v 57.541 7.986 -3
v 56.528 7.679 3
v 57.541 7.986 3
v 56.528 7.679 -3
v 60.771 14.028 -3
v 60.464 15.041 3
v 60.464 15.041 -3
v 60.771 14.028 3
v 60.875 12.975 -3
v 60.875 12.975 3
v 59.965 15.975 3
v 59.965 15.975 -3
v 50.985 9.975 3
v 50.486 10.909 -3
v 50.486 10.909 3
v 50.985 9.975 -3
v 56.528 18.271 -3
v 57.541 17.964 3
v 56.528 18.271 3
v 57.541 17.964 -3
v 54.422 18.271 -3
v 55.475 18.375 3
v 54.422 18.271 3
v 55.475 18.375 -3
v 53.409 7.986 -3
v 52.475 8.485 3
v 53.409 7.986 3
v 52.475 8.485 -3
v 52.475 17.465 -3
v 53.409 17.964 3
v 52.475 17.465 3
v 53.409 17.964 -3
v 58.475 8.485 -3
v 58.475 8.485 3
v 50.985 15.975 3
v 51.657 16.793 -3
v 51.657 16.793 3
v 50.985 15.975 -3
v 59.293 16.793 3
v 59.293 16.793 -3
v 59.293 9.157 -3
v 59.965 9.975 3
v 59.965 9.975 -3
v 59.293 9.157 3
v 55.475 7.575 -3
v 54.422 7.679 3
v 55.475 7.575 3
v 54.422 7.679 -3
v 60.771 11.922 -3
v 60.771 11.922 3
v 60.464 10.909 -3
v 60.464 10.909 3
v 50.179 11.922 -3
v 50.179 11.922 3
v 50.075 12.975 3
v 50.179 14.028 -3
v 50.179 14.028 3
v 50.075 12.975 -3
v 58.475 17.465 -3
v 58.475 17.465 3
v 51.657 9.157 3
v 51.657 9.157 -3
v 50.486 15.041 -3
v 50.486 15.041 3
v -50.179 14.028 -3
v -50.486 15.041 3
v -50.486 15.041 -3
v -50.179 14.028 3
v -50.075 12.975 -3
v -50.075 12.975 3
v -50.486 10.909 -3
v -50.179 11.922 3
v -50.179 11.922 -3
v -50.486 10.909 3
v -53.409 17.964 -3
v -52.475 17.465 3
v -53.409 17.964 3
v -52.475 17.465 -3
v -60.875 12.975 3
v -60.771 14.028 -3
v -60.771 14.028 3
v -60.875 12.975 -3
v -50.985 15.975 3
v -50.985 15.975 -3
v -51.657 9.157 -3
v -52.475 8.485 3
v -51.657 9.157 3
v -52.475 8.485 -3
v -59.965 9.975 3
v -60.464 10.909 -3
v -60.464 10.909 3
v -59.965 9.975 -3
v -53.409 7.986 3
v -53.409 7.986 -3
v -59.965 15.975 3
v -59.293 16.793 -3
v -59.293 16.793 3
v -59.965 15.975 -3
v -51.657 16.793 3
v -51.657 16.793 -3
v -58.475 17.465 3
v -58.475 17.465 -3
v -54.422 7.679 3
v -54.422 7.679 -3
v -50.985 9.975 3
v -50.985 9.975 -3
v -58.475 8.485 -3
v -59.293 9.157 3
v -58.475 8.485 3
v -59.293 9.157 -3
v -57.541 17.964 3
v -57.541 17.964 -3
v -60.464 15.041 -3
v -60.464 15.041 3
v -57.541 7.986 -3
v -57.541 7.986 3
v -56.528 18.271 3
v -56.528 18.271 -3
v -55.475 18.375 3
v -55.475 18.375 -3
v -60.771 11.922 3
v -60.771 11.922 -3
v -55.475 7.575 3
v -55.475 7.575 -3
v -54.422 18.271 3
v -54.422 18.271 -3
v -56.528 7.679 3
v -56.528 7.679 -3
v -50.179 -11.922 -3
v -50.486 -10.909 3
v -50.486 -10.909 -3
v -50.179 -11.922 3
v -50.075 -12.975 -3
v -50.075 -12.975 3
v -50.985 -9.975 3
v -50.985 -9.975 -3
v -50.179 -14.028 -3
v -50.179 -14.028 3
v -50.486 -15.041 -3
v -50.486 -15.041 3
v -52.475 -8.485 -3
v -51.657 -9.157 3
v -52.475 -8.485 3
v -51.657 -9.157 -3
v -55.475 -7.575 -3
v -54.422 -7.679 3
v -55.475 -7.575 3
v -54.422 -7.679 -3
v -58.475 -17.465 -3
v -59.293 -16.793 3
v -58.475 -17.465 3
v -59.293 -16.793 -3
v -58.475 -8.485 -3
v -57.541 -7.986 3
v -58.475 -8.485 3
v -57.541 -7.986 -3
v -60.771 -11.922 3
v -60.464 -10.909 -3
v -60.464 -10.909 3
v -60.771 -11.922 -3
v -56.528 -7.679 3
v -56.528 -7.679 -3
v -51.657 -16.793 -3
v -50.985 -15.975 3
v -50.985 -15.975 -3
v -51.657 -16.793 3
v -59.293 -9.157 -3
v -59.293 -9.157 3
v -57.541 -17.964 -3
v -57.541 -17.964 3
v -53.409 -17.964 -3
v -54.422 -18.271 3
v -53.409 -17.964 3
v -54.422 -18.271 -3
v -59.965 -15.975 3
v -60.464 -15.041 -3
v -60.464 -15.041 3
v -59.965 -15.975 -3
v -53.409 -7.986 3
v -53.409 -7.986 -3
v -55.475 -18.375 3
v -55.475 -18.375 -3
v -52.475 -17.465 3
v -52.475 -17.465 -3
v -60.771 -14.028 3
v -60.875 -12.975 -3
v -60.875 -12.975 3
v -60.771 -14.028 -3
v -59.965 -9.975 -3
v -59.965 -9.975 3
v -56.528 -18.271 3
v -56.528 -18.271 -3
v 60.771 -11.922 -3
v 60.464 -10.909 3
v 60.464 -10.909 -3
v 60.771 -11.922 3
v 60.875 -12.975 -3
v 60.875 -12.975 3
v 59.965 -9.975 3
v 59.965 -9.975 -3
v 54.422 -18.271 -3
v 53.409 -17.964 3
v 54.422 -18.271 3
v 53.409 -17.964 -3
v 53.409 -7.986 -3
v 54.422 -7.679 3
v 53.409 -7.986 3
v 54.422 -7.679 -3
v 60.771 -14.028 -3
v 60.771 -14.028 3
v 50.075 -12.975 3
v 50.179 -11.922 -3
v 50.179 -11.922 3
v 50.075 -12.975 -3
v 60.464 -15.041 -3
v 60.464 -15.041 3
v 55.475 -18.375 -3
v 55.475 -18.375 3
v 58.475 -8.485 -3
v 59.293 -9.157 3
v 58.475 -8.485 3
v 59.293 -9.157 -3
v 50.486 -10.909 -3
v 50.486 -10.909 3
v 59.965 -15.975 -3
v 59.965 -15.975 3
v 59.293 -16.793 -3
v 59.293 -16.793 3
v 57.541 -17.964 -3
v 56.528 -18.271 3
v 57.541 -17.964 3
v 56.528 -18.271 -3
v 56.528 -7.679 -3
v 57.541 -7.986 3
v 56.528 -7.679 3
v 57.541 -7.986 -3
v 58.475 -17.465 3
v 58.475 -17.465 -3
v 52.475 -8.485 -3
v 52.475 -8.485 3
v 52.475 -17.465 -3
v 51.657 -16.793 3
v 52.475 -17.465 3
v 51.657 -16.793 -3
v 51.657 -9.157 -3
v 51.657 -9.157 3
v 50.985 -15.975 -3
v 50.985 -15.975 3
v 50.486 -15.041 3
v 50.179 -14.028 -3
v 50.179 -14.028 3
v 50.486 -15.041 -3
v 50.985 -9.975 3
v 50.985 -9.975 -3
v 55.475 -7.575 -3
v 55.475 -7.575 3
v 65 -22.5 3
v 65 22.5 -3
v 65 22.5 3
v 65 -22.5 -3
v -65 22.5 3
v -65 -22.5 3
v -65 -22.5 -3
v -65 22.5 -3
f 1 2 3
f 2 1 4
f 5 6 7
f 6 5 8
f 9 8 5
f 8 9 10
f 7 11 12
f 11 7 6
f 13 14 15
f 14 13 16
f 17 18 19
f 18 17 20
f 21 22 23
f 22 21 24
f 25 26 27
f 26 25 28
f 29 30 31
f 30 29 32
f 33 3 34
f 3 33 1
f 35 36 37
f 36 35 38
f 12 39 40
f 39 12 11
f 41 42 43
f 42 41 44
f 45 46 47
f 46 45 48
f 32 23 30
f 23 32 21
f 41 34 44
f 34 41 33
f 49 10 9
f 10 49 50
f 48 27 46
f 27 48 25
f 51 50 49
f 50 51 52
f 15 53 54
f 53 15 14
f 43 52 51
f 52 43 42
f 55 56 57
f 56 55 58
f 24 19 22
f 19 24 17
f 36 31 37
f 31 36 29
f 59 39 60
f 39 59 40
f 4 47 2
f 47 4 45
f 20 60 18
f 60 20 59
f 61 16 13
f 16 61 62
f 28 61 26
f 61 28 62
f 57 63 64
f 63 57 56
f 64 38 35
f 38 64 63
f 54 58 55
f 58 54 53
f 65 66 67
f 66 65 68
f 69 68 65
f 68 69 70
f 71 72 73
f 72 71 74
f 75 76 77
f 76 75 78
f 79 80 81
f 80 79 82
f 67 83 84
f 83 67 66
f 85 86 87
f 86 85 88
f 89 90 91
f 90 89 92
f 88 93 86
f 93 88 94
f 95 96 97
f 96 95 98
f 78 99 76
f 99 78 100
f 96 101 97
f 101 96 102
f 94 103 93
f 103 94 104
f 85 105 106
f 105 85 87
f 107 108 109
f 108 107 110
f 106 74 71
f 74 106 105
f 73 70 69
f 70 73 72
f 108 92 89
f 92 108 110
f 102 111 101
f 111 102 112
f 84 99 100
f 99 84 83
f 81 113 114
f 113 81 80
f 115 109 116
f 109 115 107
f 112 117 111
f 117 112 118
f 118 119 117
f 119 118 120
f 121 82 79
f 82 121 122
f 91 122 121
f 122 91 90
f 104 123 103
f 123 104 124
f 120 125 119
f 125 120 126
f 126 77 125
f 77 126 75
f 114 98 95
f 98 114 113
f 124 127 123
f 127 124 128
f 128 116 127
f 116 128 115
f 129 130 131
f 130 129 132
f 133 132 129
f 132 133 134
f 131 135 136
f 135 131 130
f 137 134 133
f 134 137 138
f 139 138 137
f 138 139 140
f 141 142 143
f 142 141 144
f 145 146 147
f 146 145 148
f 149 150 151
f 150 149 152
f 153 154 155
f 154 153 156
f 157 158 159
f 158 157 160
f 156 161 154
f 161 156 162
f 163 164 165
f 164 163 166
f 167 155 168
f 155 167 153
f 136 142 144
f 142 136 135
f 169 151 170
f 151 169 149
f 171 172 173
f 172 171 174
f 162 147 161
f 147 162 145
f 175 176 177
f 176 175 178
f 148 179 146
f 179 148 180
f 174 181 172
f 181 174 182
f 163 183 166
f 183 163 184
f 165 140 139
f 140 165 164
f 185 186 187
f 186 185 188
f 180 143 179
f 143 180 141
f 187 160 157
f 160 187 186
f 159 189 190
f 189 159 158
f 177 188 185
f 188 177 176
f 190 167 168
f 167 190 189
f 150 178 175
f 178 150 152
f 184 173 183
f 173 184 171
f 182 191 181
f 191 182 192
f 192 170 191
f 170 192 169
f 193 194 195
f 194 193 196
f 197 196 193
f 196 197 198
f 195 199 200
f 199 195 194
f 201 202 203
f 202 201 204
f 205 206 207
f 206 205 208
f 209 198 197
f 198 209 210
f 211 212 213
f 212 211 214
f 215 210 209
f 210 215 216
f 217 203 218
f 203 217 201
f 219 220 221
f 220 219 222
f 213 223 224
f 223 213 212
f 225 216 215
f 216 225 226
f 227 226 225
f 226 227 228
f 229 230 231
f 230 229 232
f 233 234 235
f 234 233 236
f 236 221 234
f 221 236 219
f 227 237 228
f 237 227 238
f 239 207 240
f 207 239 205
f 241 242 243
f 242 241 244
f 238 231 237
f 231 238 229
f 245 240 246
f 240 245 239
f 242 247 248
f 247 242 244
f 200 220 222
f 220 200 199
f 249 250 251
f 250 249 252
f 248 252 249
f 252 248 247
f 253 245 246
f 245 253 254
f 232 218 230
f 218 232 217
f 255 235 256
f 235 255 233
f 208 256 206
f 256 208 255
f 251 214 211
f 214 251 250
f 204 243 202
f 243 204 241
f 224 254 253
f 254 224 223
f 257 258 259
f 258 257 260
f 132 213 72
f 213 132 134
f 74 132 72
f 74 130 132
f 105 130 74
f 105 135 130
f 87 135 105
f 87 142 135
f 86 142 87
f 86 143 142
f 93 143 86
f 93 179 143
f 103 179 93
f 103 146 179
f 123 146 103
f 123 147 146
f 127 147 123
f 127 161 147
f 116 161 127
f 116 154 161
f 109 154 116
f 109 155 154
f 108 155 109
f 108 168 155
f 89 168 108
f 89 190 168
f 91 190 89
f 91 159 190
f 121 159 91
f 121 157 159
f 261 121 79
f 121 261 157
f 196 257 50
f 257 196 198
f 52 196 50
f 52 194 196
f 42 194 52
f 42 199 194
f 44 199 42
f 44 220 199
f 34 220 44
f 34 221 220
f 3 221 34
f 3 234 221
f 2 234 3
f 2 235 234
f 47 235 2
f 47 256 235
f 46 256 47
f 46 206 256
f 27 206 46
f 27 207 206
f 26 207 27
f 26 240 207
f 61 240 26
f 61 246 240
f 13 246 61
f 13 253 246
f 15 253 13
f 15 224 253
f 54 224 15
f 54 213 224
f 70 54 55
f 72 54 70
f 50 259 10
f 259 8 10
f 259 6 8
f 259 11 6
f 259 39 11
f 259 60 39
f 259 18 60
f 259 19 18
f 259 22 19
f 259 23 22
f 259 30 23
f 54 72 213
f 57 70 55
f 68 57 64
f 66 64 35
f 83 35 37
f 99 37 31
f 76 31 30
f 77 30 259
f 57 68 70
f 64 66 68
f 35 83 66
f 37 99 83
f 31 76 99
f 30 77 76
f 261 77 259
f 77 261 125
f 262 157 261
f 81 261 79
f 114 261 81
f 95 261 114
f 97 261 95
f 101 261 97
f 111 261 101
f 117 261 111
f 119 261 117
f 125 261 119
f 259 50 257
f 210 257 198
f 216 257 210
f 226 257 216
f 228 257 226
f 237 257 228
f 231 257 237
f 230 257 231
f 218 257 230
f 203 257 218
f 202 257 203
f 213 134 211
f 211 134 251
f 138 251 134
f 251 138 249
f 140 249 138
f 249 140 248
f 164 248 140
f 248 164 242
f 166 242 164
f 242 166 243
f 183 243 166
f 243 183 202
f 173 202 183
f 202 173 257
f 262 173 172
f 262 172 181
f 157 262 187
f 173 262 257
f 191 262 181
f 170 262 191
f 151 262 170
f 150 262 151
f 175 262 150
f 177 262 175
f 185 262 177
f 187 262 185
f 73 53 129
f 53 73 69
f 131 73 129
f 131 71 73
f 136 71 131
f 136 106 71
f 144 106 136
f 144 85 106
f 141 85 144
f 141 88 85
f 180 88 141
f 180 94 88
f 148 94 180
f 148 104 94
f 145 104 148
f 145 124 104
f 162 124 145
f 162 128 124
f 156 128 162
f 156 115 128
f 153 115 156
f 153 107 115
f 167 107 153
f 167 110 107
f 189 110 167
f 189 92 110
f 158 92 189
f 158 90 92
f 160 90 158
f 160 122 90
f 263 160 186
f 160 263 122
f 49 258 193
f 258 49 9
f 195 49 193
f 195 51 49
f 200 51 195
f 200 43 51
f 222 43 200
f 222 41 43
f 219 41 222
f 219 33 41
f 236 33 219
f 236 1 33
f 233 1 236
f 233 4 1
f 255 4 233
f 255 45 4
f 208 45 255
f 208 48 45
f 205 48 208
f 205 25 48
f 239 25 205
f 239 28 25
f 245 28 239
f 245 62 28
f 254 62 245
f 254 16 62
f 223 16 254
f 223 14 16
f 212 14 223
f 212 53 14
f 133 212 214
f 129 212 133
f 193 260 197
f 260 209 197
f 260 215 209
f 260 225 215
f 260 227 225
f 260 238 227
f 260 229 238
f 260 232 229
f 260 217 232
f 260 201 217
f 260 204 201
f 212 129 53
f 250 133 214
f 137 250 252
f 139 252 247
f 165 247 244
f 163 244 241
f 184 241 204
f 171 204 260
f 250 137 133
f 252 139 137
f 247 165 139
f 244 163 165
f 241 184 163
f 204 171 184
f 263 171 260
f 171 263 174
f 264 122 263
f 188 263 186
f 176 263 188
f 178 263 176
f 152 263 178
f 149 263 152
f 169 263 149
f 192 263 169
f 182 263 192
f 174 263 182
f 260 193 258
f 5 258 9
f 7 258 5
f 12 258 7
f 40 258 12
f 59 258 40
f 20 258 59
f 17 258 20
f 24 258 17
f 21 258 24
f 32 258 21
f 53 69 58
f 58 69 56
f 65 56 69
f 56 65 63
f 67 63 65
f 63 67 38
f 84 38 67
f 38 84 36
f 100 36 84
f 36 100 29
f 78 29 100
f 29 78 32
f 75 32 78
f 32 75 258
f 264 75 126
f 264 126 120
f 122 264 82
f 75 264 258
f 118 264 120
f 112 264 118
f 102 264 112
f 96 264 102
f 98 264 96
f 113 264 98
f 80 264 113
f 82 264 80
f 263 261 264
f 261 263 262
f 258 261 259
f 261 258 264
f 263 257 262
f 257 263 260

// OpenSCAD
$fn = 32;

// ----------------------------------------------------------------------
// Corner plate 130 x 45 x 6
// 4 holes, centres taken from the edge offset
// ----------------------------------------------------------------------

// --- parameters (mm) ---
plate = [130, 45, 6];   // overall size (x, y, z)
holes = 4;              // number of holes the drawing asks for
bore_d = 10.5;          // nominal hole diameter from the drawing
print_allowance = 0.3;  // clearance added for printing
edge = 9.525;           // hole centre offset from the plate edge

// --- derived feature positions (mm) ---
hole_d = bore_d + print_allowance;  // = 10.8   hole diameter as printed
corner_x = plate[0] / 2 - edge;     // = 55.48   corner hole X
corner_y = plate[1] / 2 - edge;     // = 12.97   corner hole Y
feature_centers = [
  [corner_x, corner_y],
  [-corner_x, corner_y],
  [-corner_x, -corner_y],
  [corner_x, -corner_y]
];   // hole centres the loop below drills

// plate outline, every hole drilled through with the same cutters
difference() {
  cube(plate, center = true);
  for (centre = feature_centers)
    translate([centre[0], centre[1], 0])
      cylinder(d = hole_d, h = plate[2] + 2, center = true);
}
